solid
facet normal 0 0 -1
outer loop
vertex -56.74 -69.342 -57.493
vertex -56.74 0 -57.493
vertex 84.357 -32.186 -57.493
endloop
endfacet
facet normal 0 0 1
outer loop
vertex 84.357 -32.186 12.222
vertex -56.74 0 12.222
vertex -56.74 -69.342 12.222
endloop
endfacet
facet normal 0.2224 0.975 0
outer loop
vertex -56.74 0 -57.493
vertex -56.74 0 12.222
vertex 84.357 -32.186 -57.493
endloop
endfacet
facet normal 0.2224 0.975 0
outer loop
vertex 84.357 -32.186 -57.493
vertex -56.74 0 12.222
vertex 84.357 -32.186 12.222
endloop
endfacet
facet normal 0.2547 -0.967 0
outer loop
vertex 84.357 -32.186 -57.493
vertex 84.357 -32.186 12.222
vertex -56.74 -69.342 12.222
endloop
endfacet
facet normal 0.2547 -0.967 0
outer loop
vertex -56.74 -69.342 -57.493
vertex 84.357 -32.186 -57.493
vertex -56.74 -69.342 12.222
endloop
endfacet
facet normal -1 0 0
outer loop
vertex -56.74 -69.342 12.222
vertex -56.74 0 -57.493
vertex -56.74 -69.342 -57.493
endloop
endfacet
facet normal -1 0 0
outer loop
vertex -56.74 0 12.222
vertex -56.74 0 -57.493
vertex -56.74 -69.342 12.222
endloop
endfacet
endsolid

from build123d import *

# Parameters (mm, degrees)
F0_W     = 141.0973854363
F0_H     = 69.7157457471
F1_DEPTH = 69.342
F3_DEPTH = 115.062
F5_DEPTH = 121.158


with BuildPart() as f1:
    # F0 (on Front) → F1 (new body)
    with BuildSketch(Plane.XZ):
        with Locations((13.8084646314, -22.6355418563)):
            Rectangle(F0_W, F0_H)
    extrude(amount=F1_DEPTH)

    # F2 (on face) → F3 (cut)
    with BuildSketch(Plane.XY.offset(12.2223310173)):
        Polygon((84.3571573496, -32.1864075959), (-56.7402280867, -69.342), (84.3571573496, -69.342), align=None)
    extrude(amount=-F3_DEPTH, mode=Mode.SUBTRACT)

    # F4 (on face) → F5 (cut)
    with BuildSketch(Plane.XY.offset(12.2223310173)):
        Polygon((84.3571573496, 0), (-56.7402280867, 0), (84.3571573496, -32.1864075959), align=None)
    extrude(amount=-F5_DEPTH, mode=Mode.SUBTRACT)


solid = f1.part
